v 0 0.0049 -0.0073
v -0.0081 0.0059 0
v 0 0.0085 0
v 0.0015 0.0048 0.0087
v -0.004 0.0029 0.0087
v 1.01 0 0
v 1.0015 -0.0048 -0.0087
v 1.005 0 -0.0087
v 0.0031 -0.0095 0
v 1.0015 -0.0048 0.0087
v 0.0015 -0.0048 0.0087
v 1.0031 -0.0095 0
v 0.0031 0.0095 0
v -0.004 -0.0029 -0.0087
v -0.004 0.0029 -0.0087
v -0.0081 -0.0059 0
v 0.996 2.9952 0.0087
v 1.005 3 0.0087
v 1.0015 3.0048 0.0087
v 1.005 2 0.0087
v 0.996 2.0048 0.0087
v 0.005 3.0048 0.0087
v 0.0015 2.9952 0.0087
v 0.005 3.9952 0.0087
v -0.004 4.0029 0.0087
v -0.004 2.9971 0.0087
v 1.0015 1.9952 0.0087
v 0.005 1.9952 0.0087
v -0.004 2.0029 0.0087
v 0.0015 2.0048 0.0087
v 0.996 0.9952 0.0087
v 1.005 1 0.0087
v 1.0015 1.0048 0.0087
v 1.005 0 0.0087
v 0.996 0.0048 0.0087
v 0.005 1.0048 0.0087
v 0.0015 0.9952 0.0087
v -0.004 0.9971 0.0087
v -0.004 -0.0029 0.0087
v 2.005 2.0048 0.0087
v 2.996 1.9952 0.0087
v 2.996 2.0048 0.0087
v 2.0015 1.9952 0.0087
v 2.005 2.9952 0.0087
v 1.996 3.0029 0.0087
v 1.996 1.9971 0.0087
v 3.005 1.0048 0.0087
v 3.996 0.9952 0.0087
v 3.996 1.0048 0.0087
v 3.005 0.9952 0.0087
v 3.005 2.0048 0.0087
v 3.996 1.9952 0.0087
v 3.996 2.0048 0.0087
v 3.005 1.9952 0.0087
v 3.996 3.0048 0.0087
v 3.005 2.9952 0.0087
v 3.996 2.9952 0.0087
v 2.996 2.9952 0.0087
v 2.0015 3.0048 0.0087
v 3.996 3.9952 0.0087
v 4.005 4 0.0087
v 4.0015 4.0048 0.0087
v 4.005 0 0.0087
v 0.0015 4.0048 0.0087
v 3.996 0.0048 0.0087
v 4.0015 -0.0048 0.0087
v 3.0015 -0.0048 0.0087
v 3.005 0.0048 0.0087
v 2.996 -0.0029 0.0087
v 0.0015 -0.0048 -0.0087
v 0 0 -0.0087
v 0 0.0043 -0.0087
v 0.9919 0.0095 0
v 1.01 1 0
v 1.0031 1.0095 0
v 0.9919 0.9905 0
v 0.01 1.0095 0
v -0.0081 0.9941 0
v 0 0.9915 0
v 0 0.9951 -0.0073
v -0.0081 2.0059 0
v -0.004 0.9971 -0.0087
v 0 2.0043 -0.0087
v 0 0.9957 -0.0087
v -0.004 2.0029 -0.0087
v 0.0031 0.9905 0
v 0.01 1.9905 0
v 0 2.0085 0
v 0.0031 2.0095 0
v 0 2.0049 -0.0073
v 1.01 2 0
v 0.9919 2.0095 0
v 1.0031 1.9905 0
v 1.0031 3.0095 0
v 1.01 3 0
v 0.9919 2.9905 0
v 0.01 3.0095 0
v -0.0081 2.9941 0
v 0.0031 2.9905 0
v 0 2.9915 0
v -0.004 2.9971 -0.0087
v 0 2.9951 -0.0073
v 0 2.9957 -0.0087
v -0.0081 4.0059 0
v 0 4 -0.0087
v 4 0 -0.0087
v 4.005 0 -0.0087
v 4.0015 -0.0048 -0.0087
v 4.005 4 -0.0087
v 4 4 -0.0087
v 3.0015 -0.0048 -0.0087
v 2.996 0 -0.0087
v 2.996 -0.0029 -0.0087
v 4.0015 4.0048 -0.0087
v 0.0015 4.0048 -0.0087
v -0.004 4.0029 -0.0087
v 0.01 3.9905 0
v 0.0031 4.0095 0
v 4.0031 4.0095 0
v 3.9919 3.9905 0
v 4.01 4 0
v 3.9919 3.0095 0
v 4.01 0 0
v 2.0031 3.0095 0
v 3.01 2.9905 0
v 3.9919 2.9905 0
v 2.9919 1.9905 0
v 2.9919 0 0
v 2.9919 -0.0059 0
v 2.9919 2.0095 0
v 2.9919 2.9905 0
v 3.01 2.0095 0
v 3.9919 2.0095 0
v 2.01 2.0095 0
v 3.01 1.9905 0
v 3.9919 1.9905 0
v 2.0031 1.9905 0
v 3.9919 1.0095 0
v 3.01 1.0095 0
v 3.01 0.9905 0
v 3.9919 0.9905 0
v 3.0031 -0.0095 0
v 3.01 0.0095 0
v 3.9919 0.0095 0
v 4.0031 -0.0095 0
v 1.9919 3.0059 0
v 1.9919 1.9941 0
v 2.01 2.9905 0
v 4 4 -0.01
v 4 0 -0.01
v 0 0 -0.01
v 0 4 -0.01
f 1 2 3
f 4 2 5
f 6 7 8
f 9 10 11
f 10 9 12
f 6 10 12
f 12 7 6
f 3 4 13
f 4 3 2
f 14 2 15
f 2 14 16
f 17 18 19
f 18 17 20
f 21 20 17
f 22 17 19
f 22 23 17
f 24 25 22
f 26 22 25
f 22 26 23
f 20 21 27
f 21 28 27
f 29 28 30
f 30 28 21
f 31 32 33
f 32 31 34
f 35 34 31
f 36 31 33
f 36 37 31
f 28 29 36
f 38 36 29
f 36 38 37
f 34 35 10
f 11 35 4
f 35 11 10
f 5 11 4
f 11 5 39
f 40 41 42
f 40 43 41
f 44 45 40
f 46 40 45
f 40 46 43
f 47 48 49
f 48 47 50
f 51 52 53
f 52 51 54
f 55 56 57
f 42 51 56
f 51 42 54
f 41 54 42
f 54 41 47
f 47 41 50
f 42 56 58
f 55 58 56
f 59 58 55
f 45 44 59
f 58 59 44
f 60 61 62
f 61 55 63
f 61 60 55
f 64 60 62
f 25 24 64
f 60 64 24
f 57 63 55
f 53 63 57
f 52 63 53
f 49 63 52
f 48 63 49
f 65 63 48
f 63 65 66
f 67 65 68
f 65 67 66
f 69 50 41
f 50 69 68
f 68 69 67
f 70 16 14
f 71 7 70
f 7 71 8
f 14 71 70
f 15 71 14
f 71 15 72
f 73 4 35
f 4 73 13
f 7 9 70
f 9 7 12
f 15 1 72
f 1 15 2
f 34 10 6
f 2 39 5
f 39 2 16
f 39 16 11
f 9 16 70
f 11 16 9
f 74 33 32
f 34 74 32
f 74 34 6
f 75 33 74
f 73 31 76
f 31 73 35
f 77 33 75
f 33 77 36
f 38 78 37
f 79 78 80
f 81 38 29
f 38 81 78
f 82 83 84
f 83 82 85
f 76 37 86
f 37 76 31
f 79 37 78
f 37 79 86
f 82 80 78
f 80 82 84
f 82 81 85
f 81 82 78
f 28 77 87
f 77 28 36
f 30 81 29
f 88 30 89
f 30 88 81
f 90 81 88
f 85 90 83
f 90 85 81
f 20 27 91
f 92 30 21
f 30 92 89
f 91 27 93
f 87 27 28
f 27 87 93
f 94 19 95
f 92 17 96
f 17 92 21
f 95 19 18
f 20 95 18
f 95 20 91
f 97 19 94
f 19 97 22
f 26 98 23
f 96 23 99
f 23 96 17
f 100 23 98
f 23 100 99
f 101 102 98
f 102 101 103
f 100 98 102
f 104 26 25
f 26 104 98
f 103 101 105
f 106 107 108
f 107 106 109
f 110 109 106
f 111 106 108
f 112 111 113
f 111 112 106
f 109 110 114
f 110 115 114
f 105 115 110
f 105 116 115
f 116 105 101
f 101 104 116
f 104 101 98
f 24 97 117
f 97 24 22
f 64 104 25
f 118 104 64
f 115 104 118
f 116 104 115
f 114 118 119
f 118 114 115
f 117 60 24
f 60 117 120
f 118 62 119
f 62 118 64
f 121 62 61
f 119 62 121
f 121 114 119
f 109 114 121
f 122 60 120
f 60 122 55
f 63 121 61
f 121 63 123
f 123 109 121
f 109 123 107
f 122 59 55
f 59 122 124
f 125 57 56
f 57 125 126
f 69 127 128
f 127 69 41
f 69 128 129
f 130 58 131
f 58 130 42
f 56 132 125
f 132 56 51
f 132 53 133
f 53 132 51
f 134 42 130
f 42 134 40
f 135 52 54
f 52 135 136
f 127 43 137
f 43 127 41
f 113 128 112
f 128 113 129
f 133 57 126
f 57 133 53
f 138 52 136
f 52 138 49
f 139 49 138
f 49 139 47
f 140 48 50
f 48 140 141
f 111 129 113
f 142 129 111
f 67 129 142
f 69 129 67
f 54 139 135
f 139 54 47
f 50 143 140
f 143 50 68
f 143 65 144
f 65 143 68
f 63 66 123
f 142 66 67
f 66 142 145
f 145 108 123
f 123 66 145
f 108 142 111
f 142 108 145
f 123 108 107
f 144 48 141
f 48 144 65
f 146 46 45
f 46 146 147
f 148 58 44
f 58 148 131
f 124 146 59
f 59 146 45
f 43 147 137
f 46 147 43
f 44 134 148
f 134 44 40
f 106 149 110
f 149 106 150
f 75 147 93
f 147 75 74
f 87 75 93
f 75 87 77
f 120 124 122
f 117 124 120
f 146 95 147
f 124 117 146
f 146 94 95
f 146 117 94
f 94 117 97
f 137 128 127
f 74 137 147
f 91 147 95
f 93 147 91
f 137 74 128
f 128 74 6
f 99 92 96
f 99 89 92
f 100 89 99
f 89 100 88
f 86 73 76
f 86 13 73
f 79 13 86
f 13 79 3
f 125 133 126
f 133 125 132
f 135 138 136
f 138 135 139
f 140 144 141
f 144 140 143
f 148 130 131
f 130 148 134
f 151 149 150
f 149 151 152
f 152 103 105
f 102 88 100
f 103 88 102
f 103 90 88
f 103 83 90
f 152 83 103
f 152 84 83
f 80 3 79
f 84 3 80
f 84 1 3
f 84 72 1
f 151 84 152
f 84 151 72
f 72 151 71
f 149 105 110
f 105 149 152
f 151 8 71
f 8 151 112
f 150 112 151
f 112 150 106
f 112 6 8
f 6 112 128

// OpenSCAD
hull(){
    translate([0.0, 0.0]) sphere(0.01);
    translate([1.0, 0.0]) sphere(0.01);
}
hull(){
    translate([1.0, 0.0]) sphere(0.01);
    translate([1.0, 1.0]) sphere(0.01);
}
hull(){
    translate([1.0, 1.0]) sphere(0.01);
    translate([0.0, 1.0]) sphere(0.01);
}
hull(){
    translate([0.0, 1.0]) sphere(0.01);
    translate([0.0, 2.0]) sphere(0.01);
}
hull(){
    translate([0.0, 2.0]) sphere(0.01);
    translate([1.0, 2.0]) sphere(0.01);
}
hull(){
    translate([1.0, 2.0]) sphere(0.01);
    translate([1.0, 3.0]) sphere(0.01);
}
hull(){
    translate([1.0, 3.0]) sphere(0.01);
    translate([0.0, 3.0]) sphere(0.01);
}
hull(){
    translate([0.0, 3.0]) sphere(0.01);
    translate([0.0, 4.0]) sphere(0.01);
}
hull(){
    translate([0.0, 4.0]) sphere(0.01);
    translate([1.0, 4.0]) sphere(0.01);
}
hull(){
    translate([1.0, 4.0]) sphere(0.01);
    translate([2.0, 4.0]) sphere(0.01);
}
hull(){
    translate([2.0, 4.0]) sphere(0.01);
    translate([3.0, 4.0]) sphere(0.01);
}
hull(){
    translate([3.0, 4.0]) sphere(0.01);
    translate([4.0, 4.0]) sphere(0.01);
}
hull(){
    translate([4.0, 4.0]) sphere(0.01);
    translate([4.0, 3.0]) sphere(0.01);
}
hull(){
    translate([4.0, 3.0]) sphere(0.01);
    translate([3.0, 3.0]) sphere(0.01);
}
hull(){
    translate([3.0, 3.0]) sphere(0.01);
    translate([3.0, 2.0]) sphere(0.01);
}
hull(){
    translate([3.0, 2.0]) sphere(0.01);
    translate([4.0, 2.0]) sphere(0.01);
}
hull(){
    translate([4.0, 2.0]) sphere(0.01);
    translate([4.0, 1.0]) sphere(0.01);
}
hull(){
    translate([4.0, 1.0]) sphere(0.01);
    translate([3.0, 1.0]) sphere(0.01);
}
hull(){
    translate([3.0, 1.0]) sphere(0.01);
    translate([3.0, 0.0]) sphere(0.01);
}
hull(){
    translate([3.0, 0.0]) sphere(0.01);
    translate([4.0, 0.0]) sphere(0.01);
}
hull(){
    translate([4.0, 0.0]) sphere(0.01);
    translate([4.0, 1.0]) sphere(0.01);
}
hull(){
    translate([4.0, 1.0]) sphere(0.01);
    translate([3.0, 1.0]) sphere(0.01);
}
hull(){
    translate([3.0, 1.0]) sphere(0.01);
    translate([3.0, 2.0]) sphere(0.01);
}
hull(){
    translate([3.0, 2.0]) sphere(0.01);
    translate([4.0, 2.0]) sphere(0.01);
}
hull(){
    translate([4.0, 2.0]) sphere(0.01);
    translate([4.0, 3.0]) sphere(0.01);
}
hull(){
    translate([4.0, 3.0]) sphere(0.01);
    translate([3.0, 3.0]) sphere(0.01);
}
hull(){
    translate([3.0, 3.0]) sphere(0.01);
    translate([2.0, 3.0]) sphere(0.01);
}
hull(){
    translate([2.0, 3.0]) sphere(0.01);
    translate([2.0, 2.0]) sphere(0.01);
}
hull(){
    translate([2.0, 2.0]) sphere(0.01);
    translate([3.0, 2.0]) sphere(0.01);
}
translate([0,0,-0.01]) color([0.1,0.1,0.1]) cube([4,4,0.01]);
